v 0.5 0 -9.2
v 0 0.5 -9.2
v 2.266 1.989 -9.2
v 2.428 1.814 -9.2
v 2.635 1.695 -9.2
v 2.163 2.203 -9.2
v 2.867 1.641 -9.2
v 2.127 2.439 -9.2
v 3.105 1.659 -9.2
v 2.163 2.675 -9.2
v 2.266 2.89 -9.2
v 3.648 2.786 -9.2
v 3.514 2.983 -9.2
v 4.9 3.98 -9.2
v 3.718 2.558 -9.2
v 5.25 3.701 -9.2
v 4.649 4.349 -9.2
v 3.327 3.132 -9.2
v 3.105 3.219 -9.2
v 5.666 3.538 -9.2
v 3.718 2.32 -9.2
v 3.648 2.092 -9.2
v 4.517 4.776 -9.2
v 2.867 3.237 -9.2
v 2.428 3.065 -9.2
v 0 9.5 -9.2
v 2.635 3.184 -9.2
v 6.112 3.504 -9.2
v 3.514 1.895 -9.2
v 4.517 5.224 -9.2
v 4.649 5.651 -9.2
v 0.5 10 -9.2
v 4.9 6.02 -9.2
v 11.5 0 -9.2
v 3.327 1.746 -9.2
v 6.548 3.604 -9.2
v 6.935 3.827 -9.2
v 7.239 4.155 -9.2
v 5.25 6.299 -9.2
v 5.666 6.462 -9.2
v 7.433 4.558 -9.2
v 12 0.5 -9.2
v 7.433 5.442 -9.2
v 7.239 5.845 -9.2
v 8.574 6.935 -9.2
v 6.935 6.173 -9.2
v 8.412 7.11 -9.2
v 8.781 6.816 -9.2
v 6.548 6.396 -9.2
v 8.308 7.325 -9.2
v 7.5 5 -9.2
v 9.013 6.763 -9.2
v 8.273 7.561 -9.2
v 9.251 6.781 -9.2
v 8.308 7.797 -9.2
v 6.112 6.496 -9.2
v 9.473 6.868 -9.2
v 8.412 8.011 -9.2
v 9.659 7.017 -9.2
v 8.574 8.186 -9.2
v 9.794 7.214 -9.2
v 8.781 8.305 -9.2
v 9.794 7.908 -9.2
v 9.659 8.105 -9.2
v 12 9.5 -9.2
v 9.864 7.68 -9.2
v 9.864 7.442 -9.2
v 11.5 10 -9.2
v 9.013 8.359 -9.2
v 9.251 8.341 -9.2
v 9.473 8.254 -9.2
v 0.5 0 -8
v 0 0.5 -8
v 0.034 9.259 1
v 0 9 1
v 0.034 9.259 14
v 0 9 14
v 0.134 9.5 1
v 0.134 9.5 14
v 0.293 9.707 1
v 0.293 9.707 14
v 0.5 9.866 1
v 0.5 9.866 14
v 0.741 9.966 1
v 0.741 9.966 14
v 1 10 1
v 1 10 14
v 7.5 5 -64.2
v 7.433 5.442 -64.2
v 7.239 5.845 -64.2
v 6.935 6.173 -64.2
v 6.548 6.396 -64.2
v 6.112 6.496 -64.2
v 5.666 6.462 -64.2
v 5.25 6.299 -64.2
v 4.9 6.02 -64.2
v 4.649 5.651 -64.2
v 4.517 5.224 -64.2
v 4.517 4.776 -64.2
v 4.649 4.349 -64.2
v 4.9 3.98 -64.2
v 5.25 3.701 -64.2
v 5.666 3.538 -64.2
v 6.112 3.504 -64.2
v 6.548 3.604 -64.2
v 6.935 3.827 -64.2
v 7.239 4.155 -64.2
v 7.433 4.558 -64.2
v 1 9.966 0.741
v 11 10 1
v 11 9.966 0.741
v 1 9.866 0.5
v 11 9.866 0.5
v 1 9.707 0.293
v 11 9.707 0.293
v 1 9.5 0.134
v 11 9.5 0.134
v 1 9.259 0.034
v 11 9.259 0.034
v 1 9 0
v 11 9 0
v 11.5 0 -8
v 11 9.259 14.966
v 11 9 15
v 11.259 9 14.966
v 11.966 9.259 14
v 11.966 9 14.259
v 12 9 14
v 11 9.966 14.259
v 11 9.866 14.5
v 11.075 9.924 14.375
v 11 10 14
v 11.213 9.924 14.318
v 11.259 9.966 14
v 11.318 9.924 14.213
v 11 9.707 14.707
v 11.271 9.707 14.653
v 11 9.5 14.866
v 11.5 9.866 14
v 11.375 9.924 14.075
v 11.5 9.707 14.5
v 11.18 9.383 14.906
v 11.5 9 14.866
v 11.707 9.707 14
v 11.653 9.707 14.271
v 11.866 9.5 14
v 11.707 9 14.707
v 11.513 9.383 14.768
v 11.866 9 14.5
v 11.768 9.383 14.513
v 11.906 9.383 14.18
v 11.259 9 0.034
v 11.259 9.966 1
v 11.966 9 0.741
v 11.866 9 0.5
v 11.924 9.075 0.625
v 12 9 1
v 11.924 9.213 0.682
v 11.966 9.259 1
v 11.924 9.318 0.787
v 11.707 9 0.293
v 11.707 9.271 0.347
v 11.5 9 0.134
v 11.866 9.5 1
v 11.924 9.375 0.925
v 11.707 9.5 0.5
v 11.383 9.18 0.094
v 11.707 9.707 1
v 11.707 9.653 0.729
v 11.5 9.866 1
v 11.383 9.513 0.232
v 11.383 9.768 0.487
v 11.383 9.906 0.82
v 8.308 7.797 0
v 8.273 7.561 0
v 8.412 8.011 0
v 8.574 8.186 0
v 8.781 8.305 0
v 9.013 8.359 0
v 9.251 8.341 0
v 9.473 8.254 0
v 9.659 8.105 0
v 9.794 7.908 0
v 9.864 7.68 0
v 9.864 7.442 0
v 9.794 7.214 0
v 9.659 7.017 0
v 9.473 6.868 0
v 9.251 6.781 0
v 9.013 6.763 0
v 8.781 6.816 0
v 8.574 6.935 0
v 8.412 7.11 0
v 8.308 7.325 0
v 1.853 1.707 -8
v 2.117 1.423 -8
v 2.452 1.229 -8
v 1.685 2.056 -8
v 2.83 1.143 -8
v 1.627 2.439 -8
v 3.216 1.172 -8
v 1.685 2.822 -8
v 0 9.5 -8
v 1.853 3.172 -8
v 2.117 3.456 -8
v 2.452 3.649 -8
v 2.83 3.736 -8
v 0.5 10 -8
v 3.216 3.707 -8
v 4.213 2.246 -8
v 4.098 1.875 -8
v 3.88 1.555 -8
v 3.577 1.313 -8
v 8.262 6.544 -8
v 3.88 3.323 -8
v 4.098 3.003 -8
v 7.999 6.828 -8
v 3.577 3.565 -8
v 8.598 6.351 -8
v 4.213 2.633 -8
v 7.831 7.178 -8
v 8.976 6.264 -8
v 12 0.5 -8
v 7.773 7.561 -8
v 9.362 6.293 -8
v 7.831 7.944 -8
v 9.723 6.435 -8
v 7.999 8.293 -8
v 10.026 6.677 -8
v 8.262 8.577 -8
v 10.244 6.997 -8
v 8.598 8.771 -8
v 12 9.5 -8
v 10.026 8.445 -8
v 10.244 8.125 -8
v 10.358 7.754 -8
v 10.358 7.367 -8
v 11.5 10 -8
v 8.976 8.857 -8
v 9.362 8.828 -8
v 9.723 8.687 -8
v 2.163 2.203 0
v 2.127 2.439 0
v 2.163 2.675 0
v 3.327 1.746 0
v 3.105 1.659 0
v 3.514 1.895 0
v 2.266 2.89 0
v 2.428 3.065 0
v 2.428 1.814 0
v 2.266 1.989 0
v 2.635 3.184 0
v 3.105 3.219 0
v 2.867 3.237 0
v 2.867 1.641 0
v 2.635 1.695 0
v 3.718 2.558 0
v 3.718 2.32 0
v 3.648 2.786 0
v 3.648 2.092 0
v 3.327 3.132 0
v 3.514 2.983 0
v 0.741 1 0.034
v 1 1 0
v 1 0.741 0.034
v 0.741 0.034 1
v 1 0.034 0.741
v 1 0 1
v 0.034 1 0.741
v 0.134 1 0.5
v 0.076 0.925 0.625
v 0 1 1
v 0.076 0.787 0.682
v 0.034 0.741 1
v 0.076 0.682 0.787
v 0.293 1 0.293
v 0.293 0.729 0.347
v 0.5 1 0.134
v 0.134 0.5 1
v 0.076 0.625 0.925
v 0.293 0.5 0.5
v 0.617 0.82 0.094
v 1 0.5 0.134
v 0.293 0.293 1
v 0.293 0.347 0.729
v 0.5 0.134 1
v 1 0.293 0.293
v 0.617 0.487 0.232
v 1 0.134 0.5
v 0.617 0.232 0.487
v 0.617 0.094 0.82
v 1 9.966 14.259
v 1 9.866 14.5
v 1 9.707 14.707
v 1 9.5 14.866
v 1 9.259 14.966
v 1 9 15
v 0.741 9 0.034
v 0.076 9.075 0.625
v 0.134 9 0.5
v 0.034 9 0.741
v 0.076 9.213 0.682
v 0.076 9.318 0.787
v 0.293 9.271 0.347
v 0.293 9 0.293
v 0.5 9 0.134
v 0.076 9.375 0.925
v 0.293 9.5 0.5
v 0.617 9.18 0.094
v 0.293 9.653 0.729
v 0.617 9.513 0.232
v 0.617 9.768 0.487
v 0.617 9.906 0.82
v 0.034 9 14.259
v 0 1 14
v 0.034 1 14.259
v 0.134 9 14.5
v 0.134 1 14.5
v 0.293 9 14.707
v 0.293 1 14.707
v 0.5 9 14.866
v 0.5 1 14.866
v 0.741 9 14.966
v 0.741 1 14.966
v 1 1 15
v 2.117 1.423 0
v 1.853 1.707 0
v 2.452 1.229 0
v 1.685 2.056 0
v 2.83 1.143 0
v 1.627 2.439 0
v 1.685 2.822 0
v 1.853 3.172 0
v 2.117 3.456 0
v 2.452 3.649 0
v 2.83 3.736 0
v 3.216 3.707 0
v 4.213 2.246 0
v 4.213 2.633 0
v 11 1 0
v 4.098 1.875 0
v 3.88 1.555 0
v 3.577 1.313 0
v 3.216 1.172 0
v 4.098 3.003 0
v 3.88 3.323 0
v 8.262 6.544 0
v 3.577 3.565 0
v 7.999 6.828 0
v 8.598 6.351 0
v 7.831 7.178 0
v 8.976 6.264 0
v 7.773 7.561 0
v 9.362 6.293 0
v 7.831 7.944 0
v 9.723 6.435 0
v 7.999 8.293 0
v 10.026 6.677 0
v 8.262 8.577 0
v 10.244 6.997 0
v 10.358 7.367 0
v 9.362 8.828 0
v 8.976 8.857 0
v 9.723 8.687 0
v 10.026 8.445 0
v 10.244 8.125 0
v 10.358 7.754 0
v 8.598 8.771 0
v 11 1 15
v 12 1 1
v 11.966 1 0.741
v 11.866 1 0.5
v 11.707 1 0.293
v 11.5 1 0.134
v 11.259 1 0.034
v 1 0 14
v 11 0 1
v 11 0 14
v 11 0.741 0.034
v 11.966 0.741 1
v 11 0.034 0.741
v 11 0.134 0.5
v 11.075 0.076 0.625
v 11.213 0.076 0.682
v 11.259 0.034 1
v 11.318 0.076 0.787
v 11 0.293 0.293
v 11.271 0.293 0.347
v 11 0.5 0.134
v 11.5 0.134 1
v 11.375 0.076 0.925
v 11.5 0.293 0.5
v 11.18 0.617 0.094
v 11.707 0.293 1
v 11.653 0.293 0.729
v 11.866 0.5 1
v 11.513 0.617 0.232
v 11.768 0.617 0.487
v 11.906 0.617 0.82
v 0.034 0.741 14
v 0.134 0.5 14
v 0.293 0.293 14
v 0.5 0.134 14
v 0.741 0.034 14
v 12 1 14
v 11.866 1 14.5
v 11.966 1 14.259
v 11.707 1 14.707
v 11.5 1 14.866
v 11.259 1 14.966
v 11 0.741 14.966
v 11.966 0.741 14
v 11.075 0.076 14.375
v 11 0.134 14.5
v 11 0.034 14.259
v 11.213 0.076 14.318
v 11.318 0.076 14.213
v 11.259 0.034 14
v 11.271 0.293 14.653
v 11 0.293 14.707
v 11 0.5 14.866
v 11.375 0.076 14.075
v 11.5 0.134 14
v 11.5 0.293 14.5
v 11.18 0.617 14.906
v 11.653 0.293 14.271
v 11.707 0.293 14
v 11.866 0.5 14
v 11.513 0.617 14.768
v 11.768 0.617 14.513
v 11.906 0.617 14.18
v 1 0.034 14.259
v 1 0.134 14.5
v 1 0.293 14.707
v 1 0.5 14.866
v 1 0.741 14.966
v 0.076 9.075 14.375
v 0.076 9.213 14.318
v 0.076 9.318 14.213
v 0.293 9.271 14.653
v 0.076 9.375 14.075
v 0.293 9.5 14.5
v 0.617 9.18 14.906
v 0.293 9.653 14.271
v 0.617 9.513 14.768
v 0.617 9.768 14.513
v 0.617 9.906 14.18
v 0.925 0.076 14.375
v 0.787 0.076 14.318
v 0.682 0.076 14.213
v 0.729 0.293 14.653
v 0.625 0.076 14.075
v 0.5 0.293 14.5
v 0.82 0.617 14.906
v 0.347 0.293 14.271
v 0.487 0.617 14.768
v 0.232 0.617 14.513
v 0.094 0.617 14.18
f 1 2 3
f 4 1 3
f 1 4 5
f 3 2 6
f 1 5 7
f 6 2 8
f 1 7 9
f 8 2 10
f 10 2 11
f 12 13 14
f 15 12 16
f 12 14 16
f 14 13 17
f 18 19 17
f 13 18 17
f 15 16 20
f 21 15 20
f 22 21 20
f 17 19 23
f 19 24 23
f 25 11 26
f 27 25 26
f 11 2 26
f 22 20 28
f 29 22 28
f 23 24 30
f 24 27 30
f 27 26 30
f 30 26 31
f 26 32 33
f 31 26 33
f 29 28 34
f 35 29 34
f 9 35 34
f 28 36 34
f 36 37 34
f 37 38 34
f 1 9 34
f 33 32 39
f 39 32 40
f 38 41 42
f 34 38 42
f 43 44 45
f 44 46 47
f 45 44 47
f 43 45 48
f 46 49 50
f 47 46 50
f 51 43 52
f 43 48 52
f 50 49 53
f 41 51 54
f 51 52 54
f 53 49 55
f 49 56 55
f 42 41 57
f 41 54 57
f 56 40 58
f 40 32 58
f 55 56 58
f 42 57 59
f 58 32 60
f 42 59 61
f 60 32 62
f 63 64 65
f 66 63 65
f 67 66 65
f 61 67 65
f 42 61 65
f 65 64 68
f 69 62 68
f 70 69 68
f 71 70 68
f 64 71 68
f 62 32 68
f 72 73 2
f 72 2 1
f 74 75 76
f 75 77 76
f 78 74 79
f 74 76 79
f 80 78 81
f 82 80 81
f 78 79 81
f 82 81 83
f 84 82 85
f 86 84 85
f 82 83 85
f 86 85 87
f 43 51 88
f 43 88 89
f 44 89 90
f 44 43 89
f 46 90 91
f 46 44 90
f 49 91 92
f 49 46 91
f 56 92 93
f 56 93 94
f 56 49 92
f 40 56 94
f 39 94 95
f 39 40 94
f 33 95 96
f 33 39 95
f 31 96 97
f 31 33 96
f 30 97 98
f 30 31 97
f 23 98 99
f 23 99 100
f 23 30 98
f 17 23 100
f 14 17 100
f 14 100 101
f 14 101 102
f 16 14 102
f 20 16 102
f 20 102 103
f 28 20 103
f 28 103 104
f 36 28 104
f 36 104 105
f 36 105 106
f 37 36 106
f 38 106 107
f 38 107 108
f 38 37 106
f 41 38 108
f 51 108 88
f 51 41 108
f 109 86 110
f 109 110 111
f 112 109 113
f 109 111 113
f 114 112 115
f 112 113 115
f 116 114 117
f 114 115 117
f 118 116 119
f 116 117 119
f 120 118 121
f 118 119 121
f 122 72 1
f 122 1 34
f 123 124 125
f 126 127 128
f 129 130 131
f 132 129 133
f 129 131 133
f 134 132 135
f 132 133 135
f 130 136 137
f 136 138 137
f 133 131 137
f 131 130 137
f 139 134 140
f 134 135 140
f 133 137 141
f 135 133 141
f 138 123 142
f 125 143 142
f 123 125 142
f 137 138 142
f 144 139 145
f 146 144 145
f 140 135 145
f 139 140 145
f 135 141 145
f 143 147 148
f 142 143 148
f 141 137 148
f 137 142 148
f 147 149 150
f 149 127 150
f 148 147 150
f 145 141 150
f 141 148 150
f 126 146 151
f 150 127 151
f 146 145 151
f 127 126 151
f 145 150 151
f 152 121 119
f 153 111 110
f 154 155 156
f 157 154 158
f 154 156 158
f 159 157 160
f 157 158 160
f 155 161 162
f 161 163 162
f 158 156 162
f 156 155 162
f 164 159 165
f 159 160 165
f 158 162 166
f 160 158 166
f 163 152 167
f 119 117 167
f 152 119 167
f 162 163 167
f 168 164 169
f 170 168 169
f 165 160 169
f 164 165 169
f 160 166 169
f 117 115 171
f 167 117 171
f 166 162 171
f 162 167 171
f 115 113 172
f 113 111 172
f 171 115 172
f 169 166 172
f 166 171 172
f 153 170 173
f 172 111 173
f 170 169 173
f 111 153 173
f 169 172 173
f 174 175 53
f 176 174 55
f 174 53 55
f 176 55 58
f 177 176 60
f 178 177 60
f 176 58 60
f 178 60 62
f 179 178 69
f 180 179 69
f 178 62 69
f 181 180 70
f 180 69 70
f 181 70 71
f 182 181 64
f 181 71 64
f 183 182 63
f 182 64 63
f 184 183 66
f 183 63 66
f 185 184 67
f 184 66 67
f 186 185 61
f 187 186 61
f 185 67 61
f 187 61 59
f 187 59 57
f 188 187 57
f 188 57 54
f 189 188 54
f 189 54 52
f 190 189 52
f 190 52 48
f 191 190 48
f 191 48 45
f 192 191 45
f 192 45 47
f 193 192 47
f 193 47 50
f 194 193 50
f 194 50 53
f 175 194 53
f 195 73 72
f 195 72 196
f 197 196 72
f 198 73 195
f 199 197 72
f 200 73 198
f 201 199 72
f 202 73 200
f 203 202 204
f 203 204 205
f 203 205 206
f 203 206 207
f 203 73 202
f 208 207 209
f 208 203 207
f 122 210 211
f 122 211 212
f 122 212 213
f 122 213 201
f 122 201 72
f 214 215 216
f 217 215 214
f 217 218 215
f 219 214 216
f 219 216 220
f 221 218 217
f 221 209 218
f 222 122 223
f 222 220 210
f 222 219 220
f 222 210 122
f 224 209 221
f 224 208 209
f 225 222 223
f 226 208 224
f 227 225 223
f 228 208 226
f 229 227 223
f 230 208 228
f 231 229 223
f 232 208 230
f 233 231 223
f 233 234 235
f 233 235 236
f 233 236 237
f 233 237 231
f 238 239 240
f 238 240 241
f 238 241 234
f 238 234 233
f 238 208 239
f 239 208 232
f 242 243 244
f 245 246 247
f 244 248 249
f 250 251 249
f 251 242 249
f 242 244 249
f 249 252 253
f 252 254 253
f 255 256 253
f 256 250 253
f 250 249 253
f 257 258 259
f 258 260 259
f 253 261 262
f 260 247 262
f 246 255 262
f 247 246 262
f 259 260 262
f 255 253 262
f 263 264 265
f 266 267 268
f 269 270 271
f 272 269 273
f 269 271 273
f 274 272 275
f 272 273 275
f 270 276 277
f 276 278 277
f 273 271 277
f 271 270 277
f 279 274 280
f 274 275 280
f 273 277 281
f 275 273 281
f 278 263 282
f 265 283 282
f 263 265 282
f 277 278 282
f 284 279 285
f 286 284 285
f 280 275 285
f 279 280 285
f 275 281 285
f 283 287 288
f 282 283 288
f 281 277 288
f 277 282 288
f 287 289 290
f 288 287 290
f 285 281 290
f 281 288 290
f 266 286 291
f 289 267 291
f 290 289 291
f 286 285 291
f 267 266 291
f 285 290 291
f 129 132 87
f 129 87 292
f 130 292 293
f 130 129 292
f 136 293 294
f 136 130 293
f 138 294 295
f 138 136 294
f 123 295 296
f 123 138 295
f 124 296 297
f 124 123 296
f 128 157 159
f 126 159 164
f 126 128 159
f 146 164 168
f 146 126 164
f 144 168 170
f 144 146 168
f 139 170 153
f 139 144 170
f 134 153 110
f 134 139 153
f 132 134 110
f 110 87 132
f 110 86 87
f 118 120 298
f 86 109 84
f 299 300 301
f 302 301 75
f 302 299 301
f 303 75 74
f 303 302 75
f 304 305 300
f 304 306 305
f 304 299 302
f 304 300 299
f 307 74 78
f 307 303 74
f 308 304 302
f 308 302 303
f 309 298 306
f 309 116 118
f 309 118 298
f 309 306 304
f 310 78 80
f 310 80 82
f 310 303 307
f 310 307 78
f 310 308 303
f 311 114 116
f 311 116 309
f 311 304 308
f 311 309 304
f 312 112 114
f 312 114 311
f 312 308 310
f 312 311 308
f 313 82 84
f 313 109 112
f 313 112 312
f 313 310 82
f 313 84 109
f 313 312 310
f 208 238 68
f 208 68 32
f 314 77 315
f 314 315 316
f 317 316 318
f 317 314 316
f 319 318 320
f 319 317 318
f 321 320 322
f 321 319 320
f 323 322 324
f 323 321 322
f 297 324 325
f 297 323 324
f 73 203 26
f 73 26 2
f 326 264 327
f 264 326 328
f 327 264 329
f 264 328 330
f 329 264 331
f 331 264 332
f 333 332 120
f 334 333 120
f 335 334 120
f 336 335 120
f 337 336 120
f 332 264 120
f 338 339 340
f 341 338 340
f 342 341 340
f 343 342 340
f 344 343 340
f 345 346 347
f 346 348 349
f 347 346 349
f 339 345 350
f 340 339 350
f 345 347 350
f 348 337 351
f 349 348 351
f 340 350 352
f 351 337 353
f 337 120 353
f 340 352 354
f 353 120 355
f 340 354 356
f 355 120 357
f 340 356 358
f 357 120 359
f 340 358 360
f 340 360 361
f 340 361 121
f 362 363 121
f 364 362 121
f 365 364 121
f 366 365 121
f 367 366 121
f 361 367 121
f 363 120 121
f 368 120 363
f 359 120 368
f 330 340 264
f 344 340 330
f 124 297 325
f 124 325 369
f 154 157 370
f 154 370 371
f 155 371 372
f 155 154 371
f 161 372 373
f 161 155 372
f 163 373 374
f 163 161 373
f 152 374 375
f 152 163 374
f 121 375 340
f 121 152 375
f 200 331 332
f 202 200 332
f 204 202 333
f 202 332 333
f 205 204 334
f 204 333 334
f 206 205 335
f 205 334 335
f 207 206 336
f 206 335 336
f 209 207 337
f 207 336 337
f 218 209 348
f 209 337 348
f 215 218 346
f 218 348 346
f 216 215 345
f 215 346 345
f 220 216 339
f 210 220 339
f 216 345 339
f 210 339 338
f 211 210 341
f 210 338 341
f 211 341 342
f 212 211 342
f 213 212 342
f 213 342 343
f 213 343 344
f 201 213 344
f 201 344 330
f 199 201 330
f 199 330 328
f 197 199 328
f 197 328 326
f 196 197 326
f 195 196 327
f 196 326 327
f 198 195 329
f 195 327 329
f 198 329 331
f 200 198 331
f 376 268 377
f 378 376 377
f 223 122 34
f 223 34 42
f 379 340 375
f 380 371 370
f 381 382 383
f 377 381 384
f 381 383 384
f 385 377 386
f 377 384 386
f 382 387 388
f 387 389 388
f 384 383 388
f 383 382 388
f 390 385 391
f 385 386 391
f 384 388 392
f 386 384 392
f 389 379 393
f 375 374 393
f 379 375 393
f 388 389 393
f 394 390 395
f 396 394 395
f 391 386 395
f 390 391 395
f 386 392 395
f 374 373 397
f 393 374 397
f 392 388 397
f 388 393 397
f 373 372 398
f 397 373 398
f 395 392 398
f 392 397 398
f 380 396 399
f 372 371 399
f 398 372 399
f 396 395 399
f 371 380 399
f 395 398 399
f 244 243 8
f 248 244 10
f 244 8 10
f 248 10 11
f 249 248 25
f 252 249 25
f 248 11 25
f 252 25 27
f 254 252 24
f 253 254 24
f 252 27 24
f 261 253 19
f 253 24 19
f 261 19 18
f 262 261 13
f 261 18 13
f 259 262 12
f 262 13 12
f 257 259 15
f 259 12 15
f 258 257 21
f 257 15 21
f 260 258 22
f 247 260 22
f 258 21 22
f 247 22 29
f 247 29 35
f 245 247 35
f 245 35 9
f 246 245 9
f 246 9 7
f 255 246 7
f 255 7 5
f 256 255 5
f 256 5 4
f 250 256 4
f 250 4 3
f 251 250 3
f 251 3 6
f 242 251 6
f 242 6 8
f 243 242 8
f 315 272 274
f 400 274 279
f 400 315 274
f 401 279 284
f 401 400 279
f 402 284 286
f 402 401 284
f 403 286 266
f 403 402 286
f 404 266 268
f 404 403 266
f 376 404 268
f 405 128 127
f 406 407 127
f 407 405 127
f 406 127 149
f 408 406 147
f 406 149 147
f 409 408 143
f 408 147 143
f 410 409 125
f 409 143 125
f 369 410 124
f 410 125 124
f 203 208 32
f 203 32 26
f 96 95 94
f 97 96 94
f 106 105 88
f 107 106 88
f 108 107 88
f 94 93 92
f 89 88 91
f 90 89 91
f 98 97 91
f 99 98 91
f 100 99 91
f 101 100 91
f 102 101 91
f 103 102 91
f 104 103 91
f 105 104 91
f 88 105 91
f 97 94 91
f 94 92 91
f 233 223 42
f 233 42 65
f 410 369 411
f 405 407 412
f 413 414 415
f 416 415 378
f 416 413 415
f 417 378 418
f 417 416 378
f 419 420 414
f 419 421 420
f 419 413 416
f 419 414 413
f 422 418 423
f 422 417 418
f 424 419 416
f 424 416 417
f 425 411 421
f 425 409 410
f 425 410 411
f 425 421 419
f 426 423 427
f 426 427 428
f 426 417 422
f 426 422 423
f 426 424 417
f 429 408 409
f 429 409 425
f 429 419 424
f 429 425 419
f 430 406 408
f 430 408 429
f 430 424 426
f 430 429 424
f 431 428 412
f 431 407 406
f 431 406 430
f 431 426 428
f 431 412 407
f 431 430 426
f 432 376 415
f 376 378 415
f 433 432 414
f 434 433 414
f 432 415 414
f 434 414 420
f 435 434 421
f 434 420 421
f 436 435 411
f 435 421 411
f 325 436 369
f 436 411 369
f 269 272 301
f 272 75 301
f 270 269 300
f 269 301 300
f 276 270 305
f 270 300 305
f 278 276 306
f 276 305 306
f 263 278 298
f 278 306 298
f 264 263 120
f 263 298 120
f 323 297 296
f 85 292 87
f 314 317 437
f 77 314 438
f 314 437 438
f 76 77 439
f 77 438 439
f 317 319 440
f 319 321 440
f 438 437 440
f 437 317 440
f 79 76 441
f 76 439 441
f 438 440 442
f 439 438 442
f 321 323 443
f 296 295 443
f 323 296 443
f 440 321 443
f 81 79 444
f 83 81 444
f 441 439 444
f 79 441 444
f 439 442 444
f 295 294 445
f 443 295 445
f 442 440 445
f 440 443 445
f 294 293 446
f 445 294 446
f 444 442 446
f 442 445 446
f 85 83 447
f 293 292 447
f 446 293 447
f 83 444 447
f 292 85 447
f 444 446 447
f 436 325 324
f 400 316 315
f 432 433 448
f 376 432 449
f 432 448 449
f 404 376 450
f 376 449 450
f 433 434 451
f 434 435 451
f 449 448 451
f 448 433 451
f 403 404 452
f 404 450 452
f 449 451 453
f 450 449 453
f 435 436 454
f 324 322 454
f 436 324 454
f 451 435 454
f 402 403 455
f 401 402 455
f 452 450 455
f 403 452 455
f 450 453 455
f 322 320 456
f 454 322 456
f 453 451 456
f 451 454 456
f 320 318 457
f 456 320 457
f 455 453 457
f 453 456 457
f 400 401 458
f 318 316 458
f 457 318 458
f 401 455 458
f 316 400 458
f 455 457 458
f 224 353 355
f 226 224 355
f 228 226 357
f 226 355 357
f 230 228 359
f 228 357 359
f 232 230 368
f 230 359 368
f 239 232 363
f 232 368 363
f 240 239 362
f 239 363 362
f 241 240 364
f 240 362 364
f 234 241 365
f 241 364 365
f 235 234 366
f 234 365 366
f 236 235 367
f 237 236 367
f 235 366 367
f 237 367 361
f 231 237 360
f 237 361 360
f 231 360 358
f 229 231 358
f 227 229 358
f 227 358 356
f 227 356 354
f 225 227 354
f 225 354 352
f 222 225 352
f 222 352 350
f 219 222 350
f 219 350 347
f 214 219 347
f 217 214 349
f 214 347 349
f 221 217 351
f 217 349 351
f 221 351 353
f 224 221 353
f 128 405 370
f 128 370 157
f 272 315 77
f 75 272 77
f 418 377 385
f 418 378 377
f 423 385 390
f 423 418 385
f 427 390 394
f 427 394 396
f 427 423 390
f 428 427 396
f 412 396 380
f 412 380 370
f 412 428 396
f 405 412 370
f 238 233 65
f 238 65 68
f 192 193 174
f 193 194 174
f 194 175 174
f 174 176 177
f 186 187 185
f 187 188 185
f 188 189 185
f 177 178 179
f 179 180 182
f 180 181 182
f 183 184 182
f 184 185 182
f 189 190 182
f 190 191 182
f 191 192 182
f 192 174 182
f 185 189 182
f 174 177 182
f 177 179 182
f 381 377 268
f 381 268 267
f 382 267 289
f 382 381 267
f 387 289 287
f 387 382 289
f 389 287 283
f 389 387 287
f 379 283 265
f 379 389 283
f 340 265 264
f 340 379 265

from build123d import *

# Parameters (mm, degrees)
SKETCH_1_W          = 12
SKETCH_1_H          = 10
EXTRUDE_1_DEPTH     = 15
FILLET_1_R          = 1
SKETCH_2_R          = 1.3
SKETCH_2_R_2        = 0.8
EXTRUDE_2_DEPTH     = 8
EXTRUDE_3_DEPTH     = 1.2
SKETCH_6_R          = 0.8
CUT_EXTRUDE_1_DEPTH = 1.2
SKETCH_7_R          = 1.5
EXTRUDE_4_DEPTH     = 55


with BuildPart() as part:
    # 草图1 → 凸台-拉伸1 (new body)
    with BuildSketch(Plane.XY):
        with Locations((6, 5)):
            Rectangle(SKETCH_1_W, SKETCH_1_H)
    extrude(amount=EXTRUDE_1_DEPTH)

    # 圆角1
    fillet_1_edges = [part.edges().sort_by_distance(p)[0] for p in [
        (12, 5, 15),
        (6, 10, 15),
        (0, 5, 15),
        (6, 10, 0),
        (12, 5, 0),
        (6, 0, 0),
        (0, 5, 0),
        (6, 0, 15),
        (0, 10, 7.5),
        (12, 10, 7.5),
        (12, 0, 7.5),
        (0, 0, 7.5),
    ]]
    fillet(fillet_1_edges, radius=FILLET_1_R)

    # 草图2 → 凸台-拉伸2 (add)
    with BuildSketch(Plane(origin=(0, 0, 0), x_dir=(-1, 0, 0), z_dir=(0, 0, -1))):
        with Locations((-2.927114882, 2.439262401)):
            Circle(SKETCH_2_R)
        with Locations((-2.927114882, 2.439262401)):
            Circle(SKETCH_2_R_2, mode=Mode.SUBTRACT)
        with Locations((-9.072885118, 7.560737599)):
            Circle(SKETCH_2_R)
        with Locations((-9.072885118, 7.560737599)):
            Circle(SKETCH_2_R_2, mode=Mode.SUBTRACT)
    extrude(amount=EXTRUDE_2_DEPTH)

    # 草图3 → 凸台-拉伸3 (add)
    with BuildSketch(Plane(origin=(0, 0, -8), x_dir=(-1, 0, 0), z_dir=(0, 0, -1))):
        Polygon((0, 0.5), (-0.5, 0), (-11.5, 0), (-12, 0.5), (-12, 9.5), (-11.5, 10), (-0.5, 10), (0, 9.5), align=None)
    extrude(amount=EXTRUDE_3_DEPTH)

    # 草图6 → 切除-拉伸1 (cut)
    with BuildSketch(Plane(origin=(0, 0, -9.2), x_dir=(-1, 0, 0), z_dir=(0, 0, -1))):
        with Locations((-2.927114882, 2.439262401)):
            Circle(SKETCH_6_R)
        with Locations((-9.072885118, 7.560737599)):
            Circle(SKETCH_6_R)
    extrude(amount=-CUT_EXTRUDE_1_DEPTH, mode=Mode.SUBTRACT)

    # 草图7 → 凸台-拉伸4 (add)
    with BuildSketch(Plane.XY.offset(-9.2)):
        with Locations((6, 5)):
            Circle(SKETCH_7_R)
    extrude(amount=-EXTRUDE_4_DEPTH)


solid = part.part
